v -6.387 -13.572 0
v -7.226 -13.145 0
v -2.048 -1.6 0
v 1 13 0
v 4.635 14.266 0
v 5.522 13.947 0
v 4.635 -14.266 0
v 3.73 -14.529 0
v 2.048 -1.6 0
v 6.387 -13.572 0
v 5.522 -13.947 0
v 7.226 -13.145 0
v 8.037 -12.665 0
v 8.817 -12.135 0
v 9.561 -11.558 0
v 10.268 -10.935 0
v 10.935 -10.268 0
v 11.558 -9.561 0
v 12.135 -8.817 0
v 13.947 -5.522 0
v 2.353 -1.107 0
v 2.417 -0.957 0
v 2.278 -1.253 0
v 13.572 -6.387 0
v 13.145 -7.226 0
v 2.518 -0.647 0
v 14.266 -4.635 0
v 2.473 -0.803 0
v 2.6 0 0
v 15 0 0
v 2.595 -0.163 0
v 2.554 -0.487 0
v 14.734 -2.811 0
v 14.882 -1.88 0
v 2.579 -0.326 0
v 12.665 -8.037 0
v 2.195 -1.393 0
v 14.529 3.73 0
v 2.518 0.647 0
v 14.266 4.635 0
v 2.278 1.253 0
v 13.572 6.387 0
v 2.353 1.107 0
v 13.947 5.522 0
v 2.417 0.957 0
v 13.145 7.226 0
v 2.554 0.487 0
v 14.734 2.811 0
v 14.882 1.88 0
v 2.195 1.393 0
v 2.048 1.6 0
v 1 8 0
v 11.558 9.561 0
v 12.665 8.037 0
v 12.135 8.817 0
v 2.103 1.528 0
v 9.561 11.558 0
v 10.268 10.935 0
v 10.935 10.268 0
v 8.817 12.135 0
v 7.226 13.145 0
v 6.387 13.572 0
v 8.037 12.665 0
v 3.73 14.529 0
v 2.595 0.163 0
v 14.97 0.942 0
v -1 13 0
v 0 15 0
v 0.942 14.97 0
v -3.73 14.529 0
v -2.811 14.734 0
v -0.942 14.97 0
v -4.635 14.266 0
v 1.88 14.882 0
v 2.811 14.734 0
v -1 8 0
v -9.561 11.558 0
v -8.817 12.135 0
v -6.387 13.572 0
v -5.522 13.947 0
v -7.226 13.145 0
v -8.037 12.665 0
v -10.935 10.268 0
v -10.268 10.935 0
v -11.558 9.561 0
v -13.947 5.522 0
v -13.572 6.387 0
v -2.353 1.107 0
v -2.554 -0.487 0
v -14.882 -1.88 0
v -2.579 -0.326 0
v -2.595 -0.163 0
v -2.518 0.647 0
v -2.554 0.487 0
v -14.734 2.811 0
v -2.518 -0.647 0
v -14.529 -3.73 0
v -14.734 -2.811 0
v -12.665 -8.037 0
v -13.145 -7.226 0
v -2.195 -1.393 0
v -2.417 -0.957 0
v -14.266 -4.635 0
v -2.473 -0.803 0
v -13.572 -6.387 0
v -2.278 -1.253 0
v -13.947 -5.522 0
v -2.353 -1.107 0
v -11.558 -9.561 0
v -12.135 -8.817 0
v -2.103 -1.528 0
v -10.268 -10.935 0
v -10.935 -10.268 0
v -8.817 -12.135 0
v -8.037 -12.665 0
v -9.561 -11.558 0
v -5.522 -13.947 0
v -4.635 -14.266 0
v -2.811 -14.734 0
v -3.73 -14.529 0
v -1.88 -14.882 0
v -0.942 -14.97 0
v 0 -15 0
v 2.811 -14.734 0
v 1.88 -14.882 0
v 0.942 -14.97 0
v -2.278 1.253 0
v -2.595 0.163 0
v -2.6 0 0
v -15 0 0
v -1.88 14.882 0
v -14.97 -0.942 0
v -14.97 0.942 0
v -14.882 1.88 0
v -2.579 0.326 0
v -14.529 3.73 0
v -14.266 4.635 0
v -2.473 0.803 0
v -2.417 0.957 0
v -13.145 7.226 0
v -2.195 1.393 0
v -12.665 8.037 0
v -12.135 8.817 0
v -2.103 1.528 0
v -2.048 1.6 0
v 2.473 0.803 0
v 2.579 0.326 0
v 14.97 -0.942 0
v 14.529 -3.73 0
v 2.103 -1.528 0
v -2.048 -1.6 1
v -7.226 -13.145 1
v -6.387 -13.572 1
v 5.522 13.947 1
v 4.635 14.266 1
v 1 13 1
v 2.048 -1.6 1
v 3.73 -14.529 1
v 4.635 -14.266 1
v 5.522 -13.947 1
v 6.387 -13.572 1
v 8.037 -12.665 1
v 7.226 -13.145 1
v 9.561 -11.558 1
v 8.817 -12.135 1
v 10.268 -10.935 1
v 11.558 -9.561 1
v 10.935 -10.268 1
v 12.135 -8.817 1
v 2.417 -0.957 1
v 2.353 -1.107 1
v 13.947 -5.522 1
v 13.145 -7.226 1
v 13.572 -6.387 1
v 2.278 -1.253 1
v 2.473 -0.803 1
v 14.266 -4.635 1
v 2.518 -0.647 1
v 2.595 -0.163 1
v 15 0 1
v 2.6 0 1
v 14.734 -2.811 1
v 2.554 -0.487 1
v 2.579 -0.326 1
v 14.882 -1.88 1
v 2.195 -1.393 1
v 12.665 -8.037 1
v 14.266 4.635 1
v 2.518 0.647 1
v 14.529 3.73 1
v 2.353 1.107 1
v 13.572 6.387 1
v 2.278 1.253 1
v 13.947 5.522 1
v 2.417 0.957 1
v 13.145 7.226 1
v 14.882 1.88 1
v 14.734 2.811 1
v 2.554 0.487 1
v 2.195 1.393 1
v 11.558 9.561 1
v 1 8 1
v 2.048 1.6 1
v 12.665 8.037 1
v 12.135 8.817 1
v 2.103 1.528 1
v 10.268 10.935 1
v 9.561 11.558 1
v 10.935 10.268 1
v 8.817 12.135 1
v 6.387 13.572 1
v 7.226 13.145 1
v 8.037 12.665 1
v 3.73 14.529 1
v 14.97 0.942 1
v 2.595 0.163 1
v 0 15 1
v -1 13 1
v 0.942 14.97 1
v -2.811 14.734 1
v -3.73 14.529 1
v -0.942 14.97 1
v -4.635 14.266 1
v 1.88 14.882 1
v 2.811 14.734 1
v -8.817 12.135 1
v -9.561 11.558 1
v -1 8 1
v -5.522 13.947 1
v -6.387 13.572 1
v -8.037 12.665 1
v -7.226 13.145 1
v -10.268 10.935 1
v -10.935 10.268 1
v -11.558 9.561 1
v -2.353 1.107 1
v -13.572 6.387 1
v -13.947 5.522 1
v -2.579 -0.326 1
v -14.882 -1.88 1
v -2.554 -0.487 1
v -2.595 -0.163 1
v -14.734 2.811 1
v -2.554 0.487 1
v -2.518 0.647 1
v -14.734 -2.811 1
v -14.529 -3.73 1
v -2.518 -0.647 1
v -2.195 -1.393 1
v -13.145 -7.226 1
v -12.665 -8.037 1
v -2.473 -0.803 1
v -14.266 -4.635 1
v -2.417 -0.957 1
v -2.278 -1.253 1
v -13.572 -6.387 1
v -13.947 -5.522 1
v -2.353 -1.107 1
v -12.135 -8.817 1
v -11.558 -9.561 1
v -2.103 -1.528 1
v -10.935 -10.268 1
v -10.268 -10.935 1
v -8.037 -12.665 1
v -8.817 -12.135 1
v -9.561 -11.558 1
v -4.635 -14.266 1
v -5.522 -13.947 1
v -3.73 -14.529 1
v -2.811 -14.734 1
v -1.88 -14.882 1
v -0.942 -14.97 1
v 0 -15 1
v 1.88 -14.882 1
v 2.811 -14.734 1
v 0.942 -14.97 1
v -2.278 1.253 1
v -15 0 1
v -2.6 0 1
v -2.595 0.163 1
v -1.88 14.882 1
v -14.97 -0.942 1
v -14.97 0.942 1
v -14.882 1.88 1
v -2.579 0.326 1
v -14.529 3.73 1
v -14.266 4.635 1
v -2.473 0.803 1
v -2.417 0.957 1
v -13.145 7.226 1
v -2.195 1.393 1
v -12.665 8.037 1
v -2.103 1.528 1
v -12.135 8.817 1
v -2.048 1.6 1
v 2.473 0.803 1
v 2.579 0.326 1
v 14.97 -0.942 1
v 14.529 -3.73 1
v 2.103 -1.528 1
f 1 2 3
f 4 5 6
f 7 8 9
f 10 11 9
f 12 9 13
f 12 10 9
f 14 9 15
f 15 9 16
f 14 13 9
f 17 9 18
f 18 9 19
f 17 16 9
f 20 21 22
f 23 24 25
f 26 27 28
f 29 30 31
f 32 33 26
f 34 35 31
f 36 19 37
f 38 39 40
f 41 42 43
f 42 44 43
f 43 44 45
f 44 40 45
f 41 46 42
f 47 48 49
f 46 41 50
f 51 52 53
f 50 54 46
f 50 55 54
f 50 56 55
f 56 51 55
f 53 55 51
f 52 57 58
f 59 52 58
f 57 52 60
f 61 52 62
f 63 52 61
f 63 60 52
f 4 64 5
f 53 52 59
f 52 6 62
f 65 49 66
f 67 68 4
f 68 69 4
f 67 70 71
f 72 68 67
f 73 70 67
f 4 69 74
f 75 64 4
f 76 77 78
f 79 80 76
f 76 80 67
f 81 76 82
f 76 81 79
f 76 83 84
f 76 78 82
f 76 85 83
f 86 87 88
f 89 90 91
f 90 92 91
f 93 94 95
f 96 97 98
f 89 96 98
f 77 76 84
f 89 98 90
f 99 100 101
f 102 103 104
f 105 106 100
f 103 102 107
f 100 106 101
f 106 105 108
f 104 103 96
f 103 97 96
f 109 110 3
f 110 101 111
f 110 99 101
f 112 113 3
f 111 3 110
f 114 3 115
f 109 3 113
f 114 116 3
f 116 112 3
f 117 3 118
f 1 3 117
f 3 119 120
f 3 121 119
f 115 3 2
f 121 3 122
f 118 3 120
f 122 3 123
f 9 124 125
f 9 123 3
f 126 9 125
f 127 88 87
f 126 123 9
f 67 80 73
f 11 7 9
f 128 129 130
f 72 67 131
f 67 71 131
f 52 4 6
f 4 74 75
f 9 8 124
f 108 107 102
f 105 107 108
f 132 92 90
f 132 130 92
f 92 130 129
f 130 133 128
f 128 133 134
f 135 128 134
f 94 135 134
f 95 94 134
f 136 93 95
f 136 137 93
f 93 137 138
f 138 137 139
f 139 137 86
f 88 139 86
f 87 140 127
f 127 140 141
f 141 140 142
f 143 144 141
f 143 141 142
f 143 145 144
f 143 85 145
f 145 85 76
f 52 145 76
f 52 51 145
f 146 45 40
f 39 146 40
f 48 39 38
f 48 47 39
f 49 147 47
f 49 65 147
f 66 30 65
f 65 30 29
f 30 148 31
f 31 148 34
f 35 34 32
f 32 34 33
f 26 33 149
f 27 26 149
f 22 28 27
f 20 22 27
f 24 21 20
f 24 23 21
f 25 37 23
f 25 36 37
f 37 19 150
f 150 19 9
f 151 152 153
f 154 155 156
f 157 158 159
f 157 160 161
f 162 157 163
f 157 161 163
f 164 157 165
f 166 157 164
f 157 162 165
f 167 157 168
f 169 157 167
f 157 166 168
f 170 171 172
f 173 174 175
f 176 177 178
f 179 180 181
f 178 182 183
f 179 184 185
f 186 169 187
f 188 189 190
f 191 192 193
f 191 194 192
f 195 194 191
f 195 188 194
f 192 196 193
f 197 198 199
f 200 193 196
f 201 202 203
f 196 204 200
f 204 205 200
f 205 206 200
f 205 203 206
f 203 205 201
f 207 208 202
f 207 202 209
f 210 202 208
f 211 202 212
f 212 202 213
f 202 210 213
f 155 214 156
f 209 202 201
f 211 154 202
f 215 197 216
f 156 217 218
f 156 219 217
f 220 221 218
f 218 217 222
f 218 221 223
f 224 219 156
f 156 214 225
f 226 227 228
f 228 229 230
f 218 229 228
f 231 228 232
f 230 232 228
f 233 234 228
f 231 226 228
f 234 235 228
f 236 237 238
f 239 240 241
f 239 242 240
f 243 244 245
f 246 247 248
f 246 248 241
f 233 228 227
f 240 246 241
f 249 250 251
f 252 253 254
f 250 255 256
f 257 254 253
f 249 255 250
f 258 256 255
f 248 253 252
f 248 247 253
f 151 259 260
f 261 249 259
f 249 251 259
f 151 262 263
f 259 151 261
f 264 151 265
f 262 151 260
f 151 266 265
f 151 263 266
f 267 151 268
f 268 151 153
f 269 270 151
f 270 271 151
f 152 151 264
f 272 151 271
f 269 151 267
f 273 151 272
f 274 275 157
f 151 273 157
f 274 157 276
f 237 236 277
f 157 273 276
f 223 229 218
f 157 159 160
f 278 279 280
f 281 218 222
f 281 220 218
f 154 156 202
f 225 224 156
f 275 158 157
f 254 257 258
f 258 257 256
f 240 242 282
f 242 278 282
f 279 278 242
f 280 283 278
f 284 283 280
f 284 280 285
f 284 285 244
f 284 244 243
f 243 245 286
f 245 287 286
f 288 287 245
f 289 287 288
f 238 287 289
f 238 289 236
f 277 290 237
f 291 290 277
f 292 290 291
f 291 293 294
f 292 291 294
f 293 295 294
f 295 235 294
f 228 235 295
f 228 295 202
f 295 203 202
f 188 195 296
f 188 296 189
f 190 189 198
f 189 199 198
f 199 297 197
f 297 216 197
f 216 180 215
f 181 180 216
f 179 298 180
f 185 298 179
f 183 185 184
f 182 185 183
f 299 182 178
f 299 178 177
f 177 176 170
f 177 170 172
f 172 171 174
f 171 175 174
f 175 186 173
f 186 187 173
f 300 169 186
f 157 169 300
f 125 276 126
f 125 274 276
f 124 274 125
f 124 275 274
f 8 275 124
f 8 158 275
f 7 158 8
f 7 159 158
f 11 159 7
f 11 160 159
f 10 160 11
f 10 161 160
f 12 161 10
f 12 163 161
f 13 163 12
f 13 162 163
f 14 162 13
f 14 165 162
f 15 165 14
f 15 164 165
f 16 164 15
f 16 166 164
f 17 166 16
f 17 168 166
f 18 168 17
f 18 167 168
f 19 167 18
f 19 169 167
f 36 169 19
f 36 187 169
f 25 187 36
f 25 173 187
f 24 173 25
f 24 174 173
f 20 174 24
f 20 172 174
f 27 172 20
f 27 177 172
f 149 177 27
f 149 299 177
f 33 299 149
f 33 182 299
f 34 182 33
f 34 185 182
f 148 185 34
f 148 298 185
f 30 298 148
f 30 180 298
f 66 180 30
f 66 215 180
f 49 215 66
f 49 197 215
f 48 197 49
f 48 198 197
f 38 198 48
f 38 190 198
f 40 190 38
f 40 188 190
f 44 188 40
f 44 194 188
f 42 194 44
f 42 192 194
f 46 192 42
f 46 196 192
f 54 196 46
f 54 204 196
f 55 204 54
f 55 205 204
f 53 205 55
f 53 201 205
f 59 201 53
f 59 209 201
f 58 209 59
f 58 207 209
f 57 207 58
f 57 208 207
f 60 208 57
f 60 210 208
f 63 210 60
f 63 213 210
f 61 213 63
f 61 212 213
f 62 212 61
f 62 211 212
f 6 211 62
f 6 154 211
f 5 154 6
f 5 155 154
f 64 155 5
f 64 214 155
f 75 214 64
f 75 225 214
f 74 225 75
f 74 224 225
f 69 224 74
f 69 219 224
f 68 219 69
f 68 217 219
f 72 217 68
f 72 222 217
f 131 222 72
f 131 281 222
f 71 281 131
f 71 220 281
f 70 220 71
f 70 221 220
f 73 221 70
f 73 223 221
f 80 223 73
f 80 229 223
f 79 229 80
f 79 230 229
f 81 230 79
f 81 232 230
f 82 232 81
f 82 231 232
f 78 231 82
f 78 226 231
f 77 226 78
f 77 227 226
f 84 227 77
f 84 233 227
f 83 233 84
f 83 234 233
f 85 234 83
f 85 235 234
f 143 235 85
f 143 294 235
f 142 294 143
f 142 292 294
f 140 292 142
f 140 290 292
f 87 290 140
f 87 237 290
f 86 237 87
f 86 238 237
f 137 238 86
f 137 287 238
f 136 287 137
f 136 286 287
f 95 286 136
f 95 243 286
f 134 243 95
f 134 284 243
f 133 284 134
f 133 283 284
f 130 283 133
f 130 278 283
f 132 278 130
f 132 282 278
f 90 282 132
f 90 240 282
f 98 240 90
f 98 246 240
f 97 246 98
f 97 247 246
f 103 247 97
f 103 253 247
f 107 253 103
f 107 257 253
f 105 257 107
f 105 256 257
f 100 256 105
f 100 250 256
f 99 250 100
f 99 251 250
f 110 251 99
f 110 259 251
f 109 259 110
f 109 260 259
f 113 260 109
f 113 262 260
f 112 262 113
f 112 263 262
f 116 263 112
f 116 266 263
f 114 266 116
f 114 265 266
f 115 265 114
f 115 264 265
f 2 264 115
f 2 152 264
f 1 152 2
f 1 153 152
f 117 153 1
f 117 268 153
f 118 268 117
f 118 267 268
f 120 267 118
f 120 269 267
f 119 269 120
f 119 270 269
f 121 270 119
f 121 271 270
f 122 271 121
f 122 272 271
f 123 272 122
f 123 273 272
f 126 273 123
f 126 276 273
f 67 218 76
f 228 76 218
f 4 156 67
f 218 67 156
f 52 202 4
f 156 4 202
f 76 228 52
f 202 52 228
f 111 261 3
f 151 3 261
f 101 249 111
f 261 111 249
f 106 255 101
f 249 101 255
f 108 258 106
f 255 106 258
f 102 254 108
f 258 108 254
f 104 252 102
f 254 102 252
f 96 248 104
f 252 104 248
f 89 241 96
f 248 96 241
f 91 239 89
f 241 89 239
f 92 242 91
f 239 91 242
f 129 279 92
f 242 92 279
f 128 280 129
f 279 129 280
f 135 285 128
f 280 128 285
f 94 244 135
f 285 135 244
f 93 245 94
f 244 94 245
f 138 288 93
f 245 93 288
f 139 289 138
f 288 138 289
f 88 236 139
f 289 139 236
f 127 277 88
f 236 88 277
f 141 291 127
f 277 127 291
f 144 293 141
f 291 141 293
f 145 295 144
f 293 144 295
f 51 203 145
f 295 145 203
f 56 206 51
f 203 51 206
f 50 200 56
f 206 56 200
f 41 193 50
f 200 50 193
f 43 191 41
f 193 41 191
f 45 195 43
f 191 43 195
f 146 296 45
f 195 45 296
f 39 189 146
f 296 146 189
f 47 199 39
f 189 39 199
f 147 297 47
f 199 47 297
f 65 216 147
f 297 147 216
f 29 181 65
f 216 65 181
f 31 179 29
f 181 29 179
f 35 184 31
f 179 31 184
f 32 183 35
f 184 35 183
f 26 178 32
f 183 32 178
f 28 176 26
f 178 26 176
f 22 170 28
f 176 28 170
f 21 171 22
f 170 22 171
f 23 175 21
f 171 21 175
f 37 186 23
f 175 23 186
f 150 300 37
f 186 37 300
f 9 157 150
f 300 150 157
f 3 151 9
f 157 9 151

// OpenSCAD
difference() {
    linear_extrude(height=1) {
        difference() {
            circle(d=30,$fn=100);
            intersection() {
                circle(d=5.2,$fn=100);
                translate([-3,-1.6]) square([6,3.2]);
            }
                
            translate([-1,8]) square([2,5]);
        }
    }
    
    //translate([0,0,0.2]) cylinder(d=13,h=2,$fn=100);
}
